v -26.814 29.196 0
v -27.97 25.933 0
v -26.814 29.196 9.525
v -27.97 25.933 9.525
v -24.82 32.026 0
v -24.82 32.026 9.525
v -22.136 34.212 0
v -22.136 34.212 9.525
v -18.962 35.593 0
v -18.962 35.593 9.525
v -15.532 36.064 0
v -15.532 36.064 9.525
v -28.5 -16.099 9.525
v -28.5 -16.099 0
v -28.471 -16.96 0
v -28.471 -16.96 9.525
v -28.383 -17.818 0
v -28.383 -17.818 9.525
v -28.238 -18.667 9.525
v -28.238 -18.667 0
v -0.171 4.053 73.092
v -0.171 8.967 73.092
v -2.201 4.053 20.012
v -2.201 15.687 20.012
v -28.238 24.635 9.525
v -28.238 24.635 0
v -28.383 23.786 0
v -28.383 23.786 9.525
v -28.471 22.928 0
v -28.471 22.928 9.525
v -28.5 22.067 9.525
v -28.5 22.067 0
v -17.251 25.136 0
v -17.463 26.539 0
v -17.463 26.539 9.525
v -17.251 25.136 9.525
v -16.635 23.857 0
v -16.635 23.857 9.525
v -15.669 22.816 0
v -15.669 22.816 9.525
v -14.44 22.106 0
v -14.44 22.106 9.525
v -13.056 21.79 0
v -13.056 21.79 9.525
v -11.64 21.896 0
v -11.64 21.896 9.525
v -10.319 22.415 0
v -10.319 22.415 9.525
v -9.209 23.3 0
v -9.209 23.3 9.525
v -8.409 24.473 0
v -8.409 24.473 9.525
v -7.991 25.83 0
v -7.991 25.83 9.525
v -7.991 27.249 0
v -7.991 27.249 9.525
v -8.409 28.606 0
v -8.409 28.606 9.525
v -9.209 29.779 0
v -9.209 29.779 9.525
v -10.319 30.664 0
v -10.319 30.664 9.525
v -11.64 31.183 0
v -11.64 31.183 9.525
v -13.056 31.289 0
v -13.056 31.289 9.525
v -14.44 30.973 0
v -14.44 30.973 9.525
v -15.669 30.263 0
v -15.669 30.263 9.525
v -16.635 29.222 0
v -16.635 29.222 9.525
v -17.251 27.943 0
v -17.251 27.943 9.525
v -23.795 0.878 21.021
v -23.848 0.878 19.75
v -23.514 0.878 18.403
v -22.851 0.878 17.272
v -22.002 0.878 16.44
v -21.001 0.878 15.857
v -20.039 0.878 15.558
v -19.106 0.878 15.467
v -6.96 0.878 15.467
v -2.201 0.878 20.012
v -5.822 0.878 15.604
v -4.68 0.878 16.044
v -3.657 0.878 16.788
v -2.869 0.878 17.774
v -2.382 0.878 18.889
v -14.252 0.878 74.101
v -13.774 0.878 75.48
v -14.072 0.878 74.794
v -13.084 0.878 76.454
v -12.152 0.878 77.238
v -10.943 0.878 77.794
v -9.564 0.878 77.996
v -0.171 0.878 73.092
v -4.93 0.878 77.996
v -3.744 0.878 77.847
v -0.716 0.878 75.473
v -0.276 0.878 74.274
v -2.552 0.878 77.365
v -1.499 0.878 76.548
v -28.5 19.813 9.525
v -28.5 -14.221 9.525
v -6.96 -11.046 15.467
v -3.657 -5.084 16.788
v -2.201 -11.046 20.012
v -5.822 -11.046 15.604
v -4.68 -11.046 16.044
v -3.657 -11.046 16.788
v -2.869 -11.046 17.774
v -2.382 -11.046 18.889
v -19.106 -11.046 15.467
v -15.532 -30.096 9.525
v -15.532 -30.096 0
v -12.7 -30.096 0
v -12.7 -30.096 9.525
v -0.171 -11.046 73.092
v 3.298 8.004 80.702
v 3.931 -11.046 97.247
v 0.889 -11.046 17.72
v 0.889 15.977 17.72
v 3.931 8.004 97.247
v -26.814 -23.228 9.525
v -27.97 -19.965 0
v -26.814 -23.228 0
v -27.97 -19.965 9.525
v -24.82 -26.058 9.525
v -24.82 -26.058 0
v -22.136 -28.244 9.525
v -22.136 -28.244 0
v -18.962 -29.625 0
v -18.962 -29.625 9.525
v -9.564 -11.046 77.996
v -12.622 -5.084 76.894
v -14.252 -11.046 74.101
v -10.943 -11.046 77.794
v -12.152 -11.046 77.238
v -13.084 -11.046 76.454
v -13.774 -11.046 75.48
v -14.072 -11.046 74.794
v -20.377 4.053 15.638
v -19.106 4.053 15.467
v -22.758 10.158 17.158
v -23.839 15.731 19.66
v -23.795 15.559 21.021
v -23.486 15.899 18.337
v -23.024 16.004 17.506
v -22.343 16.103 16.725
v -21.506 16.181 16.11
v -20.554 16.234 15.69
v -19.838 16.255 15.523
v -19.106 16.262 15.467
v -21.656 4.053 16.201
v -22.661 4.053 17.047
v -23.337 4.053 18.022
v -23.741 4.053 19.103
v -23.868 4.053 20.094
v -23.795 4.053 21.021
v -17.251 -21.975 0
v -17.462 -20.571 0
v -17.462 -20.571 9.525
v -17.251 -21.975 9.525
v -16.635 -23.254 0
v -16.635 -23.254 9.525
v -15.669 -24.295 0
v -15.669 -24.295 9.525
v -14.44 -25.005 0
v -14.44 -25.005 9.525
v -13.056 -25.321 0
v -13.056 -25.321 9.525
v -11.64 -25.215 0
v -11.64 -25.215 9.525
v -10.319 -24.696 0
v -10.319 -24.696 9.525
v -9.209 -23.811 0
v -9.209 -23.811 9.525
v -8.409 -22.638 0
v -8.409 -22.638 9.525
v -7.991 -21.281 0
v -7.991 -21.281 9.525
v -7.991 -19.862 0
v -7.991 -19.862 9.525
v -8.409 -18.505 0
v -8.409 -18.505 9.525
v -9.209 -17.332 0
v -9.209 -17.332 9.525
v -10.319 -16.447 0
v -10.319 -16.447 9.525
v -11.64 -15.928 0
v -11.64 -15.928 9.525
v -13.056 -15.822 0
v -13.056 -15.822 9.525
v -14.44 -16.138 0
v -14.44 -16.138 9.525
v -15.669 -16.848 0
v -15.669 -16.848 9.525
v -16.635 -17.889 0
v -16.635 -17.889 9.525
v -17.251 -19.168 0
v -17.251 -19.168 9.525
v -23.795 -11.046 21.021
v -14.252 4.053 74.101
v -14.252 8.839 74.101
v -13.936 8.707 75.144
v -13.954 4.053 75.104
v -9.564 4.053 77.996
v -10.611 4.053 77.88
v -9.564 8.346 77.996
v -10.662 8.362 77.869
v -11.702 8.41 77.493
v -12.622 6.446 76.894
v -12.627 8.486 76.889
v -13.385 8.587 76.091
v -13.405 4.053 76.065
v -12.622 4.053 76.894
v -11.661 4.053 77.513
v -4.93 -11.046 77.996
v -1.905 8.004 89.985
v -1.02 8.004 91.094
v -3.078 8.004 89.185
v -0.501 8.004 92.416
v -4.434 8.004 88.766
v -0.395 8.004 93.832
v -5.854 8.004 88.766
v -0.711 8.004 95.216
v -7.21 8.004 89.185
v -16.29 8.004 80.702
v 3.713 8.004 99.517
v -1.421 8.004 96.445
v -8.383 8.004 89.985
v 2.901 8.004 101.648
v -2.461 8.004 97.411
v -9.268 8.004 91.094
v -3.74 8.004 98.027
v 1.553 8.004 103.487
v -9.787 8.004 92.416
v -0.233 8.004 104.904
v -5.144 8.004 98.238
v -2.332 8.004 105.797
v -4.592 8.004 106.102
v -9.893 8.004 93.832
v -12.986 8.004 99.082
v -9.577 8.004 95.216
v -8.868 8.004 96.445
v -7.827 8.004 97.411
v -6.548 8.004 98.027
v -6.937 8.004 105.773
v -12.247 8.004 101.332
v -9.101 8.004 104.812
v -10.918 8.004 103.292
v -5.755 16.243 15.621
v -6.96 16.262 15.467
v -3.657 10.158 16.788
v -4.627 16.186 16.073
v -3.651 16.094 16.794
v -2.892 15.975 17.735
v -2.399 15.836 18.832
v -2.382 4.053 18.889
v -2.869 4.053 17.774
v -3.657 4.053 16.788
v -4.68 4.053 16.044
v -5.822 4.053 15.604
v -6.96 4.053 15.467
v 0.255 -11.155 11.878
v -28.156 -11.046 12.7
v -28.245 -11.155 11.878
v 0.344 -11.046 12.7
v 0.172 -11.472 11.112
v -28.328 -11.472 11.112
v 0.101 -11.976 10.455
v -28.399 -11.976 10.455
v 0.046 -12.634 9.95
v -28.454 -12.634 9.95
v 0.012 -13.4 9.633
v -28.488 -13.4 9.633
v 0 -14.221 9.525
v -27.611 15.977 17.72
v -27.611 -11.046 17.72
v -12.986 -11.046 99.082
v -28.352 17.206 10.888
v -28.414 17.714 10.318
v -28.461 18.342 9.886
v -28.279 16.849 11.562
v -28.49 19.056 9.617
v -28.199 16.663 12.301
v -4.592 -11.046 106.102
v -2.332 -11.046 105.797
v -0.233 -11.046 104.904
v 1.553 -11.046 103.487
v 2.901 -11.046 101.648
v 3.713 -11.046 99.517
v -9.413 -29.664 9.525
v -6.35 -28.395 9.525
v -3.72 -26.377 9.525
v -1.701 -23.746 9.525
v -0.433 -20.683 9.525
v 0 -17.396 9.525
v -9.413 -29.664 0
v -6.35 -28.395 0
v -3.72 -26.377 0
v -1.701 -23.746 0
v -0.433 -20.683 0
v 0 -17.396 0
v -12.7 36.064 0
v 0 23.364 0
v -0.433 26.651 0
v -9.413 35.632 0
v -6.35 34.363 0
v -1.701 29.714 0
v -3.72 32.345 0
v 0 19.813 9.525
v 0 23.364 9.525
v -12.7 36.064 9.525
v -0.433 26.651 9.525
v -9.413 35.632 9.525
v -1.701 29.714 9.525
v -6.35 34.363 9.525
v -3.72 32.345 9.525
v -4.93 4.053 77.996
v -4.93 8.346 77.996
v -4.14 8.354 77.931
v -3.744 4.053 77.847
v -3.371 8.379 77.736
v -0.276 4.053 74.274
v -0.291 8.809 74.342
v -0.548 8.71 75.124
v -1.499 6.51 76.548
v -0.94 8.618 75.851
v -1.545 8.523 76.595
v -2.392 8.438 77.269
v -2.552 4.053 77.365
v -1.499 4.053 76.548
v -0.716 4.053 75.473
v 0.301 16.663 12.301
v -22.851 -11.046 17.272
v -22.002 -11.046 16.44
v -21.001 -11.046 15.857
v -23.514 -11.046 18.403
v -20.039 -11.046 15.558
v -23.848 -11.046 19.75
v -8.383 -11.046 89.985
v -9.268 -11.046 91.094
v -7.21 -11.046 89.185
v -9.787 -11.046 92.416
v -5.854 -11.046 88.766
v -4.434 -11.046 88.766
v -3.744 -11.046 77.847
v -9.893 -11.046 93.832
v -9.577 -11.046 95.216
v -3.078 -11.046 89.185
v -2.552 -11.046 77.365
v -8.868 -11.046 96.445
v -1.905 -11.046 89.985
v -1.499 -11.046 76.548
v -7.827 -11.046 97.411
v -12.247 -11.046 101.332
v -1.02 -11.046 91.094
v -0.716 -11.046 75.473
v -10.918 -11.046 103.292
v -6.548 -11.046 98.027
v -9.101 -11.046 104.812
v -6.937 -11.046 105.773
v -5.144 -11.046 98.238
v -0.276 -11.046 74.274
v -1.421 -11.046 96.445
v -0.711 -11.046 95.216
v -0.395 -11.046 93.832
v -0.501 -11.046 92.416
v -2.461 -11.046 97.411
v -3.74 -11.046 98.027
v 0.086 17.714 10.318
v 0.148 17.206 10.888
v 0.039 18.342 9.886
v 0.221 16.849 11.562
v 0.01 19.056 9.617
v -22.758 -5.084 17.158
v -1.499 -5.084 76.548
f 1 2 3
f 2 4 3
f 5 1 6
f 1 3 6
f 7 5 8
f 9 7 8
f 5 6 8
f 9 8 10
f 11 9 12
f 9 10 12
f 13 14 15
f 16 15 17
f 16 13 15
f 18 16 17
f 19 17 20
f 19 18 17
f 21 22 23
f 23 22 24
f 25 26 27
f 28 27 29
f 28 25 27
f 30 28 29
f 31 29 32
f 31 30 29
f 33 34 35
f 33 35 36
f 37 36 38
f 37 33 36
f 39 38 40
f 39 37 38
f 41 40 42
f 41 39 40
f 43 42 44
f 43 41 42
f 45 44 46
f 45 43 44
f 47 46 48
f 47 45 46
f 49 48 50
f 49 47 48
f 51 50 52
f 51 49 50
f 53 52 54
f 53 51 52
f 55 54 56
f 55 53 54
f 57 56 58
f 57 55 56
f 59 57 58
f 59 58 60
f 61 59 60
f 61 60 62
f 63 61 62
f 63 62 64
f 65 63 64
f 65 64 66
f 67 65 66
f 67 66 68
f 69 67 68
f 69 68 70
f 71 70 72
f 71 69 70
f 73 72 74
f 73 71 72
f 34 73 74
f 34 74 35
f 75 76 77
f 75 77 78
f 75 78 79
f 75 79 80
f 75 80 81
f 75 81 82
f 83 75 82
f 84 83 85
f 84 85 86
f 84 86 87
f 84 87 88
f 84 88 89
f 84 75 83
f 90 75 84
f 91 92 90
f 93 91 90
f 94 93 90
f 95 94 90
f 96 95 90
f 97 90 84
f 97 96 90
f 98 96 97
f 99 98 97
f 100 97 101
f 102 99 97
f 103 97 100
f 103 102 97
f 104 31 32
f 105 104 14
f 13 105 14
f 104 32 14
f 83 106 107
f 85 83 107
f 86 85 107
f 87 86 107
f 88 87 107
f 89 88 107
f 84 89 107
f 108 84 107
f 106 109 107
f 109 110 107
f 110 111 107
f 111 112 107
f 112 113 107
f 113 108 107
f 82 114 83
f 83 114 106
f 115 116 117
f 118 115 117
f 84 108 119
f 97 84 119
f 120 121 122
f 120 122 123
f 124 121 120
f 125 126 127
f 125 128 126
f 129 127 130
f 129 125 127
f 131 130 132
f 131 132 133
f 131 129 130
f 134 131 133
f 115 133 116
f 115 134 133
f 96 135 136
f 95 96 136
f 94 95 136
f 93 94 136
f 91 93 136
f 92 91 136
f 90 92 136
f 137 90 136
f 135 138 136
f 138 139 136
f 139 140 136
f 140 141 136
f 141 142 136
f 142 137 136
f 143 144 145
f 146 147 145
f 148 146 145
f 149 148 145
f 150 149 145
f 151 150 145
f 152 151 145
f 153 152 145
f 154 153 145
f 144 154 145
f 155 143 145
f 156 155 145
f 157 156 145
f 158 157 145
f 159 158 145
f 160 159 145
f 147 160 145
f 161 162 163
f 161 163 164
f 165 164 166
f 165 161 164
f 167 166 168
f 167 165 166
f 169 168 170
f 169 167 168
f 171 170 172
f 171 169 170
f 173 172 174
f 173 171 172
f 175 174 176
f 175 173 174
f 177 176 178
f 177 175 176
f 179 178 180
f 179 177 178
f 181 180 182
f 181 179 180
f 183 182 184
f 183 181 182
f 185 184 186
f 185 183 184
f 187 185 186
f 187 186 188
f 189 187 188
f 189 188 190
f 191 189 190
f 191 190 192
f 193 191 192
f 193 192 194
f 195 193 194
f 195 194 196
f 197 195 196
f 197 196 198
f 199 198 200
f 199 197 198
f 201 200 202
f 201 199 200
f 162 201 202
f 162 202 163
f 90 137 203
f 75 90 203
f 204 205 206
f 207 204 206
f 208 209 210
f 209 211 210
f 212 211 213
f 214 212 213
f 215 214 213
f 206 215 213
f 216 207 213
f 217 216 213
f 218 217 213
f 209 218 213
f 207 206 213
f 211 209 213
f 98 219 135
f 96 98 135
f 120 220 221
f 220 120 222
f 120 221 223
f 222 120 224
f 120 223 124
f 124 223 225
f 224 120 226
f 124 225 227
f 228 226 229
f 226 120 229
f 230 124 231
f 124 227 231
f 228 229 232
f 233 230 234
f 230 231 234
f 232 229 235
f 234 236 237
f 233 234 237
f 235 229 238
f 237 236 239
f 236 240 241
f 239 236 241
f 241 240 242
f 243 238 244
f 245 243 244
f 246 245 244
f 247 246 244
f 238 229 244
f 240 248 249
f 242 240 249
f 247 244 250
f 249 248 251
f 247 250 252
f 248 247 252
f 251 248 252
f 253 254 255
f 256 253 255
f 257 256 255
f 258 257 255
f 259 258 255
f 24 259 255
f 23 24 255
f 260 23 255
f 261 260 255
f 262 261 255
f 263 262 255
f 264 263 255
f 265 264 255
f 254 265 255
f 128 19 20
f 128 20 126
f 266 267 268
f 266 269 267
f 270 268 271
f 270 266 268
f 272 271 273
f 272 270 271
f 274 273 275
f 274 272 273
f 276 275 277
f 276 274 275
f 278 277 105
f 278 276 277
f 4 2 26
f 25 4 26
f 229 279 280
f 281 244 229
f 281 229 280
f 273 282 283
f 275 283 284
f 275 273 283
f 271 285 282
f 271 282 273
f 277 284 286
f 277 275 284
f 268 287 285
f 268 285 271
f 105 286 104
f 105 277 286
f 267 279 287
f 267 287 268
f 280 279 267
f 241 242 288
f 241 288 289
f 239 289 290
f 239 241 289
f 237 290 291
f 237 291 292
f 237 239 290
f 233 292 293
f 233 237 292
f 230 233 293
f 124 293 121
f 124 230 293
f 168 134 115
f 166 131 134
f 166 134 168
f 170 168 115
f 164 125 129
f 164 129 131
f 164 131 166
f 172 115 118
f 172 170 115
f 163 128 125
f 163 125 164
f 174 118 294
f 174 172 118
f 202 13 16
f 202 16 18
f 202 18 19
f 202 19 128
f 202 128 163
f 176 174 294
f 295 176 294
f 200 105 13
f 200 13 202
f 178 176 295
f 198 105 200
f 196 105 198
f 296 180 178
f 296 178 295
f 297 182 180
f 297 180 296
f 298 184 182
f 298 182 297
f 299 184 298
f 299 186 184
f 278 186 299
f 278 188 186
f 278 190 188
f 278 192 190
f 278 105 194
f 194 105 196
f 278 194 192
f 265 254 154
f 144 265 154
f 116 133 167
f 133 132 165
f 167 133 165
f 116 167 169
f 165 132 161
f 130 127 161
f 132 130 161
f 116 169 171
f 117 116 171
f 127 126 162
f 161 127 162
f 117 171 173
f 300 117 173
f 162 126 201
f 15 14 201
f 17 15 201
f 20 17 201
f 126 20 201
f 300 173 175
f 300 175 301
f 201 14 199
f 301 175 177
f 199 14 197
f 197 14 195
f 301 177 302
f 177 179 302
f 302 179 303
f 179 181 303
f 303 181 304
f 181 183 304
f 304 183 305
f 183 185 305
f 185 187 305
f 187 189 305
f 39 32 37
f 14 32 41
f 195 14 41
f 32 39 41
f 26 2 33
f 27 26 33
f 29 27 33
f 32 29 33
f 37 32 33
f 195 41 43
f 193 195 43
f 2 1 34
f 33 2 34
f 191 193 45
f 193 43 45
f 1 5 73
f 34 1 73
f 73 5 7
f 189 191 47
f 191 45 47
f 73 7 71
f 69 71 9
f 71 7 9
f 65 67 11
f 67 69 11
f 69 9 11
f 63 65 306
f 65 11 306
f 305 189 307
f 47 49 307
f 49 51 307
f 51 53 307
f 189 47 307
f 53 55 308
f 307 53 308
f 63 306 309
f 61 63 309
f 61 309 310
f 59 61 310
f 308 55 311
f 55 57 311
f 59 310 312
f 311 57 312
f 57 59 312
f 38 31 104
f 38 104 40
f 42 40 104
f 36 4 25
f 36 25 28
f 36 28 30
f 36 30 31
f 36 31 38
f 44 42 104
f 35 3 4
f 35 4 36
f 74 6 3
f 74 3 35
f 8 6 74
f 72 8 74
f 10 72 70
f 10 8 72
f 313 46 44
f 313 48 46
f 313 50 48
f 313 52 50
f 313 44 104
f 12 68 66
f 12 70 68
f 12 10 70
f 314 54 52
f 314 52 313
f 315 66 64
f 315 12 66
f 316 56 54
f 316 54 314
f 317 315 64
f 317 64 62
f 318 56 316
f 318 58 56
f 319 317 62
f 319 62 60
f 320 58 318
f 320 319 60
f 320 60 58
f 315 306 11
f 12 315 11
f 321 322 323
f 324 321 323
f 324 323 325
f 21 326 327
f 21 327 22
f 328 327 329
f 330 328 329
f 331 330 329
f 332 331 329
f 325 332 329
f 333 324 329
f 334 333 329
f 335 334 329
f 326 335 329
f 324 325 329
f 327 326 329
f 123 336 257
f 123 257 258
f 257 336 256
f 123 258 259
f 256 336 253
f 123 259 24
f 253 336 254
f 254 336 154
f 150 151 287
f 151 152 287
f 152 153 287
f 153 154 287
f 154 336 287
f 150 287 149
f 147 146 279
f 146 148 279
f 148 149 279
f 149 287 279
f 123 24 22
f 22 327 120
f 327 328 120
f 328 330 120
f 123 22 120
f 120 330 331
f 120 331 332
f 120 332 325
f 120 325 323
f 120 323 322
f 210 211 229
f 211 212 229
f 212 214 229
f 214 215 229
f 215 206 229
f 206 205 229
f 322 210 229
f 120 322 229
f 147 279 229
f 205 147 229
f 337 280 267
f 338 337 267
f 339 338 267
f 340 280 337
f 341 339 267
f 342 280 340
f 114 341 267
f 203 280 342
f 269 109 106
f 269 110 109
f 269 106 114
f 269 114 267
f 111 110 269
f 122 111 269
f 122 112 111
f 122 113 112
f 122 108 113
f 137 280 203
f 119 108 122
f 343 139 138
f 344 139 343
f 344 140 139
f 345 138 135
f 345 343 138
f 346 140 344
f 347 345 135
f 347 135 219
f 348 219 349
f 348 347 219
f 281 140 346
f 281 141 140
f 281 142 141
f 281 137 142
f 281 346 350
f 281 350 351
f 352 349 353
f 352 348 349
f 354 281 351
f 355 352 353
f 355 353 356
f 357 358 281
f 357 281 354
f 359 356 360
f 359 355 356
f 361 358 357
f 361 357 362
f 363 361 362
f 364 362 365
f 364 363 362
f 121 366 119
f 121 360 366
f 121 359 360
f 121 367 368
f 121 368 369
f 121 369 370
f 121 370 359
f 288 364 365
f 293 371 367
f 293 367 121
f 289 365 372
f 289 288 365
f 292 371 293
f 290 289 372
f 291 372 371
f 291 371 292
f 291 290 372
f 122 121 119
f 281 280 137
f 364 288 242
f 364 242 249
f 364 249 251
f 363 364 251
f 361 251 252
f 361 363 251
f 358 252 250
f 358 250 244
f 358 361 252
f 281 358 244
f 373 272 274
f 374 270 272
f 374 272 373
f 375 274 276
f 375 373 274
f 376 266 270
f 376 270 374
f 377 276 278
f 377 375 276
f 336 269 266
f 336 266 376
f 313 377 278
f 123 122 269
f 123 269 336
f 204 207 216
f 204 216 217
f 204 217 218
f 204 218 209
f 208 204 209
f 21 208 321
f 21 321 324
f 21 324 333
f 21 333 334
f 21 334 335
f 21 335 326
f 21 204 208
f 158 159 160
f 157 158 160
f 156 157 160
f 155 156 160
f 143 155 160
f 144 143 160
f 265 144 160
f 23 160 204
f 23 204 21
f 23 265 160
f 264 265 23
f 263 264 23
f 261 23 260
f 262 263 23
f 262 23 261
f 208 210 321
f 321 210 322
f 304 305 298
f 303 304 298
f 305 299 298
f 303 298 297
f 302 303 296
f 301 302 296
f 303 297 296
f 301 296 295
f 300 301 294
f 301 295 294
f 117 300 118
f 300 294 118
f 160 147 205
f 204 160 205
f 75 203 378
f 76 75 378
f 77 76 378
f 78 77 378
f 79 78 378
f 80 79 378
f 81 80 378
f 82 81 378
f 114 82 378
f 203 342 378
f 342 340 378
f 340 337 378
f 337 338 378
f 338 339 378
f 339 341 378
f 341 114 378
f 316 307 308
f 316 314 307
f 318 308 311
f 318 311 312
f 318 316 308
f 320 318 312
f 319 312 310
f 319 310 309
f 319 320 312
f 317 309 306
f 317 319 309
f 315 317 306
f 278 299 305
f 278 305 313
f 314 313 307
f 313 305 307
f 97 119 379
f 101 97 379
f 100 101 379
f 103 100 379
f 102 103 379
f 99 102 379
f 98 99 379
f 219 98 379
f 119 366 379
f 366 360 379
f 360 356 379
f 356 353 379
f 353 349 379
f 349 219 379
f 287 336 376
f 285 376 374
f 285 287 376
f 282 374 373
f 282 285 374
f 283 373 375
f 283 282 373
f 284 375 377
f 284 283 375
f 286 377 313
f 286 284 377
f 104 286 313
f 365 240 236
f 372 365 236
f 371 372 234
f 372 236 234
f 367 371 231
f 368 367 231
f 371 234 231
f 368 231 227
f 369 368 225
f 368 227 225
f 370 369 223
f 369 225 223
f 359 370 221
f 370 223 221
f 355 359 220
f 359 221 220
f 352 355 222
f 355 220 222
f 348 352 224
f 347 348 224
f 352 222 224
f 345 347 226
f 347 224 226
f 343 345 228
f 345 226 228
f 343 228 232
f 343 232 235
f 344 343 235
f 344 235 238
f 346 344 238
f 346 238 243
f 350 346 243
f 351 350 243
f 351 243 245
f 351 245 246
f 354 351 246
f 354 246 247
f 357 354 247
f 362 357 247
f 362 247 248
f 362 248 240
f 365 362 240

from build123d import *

# Parameters (mm, degrees)
SKETCH1_R           = 4.762499999999989
SKETCH1_R_2         = 4.762500000000005
BOSS_EXTRUDE1_DEPTH = 9.525
CHAMFER1_SIZE       = 88.89999999999999
CHAMFER1_SIZE2      = 6.20588556630559
CHAMFER2_SIZE       = 88.89999999999999
CHAMFER2_SIZE2      = 6.300746042301969
FILLET1_R           = 8.528649
CUT_EXTRUDE2_DEPTH  = 117.6635246642072
FILLET4_R           = 3.175
FILLET5_R           = 12.7
FILLET6_R           = 12.7
SKETCH15_R          = 4.762499999999997
CUT_EXTRUDE7_DEPTH  = 117.28166143642893
FILLET9_R           = 12.7
CUT_EXTRUDE8_DEPTH  = 15.760091062
CUT_EXTRUDE9_DEPTH  = 11.924211795


with BuildPart() as part:
    # Sketch1 → Boss-Extrude1 (new body)
    # profile 1 of 3: a face of its own
    with BuildSketch(Plane.XY):
        Polygon((-28.50000000000001, 23.36447913627793), (-28.500000000000007, 17.01447913627793), (-1.421e-14, 17.01447913627793), (-1.388e-14, 36.06447913627791), (-25.877441230163292, 36.06447913627793), align=None)
        with Locations(Location((-12.700000000000017, 26.539479136277926, 0), (0, 0, 180))):
            Circle(SKETCH1_R, mode=Mode.SUBTRACT)
    # profile 2 of 3: a face of its own
    with BuildSketch(Plane.XY):
        Polygon((1.421e-14, -11.046434023496033), (-28.499999999999996, -11.046434023496033), (-28.499999999999996, -17.396434023496035), (-25.877441230163278, -30.09643402349603), (1.421e-14, -30.09643402349603), align=None)
        with Locations(Location((-12.699999999999989, -20.571434023496032, 0), (0, 0, 180))):
            Circle(SKETCH1_R_2, mode=Mode.SUBTRACT)
    # profile 3 of 3: a face of its own
    with BuildSketch(Plane.XY):
        Polygon((-28.500000000000007, 17.01447913627793), (-28.5, -11.046434023496033), (1.421e-14, -11.046434023496033), (-5.89e-15, 17.014479136277927), align=None)
    extrude(amount=BOSS_EXTRUDE1_DEPTH)

    # Sweep1: sweep along a path in Sketch4
    with BuildLine(Plane(origin=(0, -11.046434023496033, 0), x_dir=(1, 0, 0), z_dir=(0, 1, 0))) as sweep1_path:
        Line((-14.249999999999991, -9.525), (-5.144041152540681, -93.4757286489478))
        Line((-5.144041152540681, -93.4757286489478), (-3.7745316583277084, -106.10167193035296))
    # Sketch3 → Sweep1 (sweep)
    with BuildSketch(Plane.XY.offset(9.525)):
        Polygon((-28.499999999999996, -11.046434023496033), (1.388e-14, -11.046434023496033), (-1.388e-14, 17.01447913627793), (-28.50000000000001, 17.01447913627793), align=None)
    sweep(path=sweep1_path.line)

    # Chamfer1
    chamfer1_edges = [part.edges().sort_by_distance(p)[0] for p in [
        (10.475468341672286, 2.9840225563909506, 106.10167193035296),
    ]]
    chamfer1_side = [part.faces().sort_by_distance(p)[0] for p in [
        (5.237734170836156, 2.9840225563909497, 57.813335965176485),
    ]]
    chamfer(chamfer1_edges, length=CHAMFER1_SIZE, length2=CHAMFER1_SIZE2, reference=chamfer1_side[0])

    # Chamfer2
    chamfer2_edges = [part.edges().sort_by_distance(p)[0] for p in [
        (-18.02453165832772, 2.984022556390949, 106.10167193035296),
    ]]
    chamfer2_side = [part.faces().sort_by_distance(p)[0] for p in [
        (-23.26226582916385, 2.9840225563909497, 57.813335965176506),
    ]]
    chamfer(chamfer2_edges, length=CHAMFER2_SIZE, length2=CHAMFER2_SIZE2, reference=chamfer2_side[0])

    # Fillet1
    fillet1_edges = [part.edges().sort_by_distance(p)[0] for p in [
        (4.269582775366721, 2.984022556390949, 106.10167193035296),
        (-11.72378561602573, 2.984022556390949, 106.10167193035296),
    ]]
    fillet(fillet1_edges, radius=FILLET1_R)

    # Sketch6 → Cut-Extrude2 (cut, through all)
    with BuildSketch(Plane.ZY.offset(28.500000000000004)):
        Polygon((106.10167193035296, -11.046434023496188), (93.47572864894777, -11.0464340234961), (80.70167193035297, -11.046434023496028), (114.70610576395035, -29.45752993708947), (128.32769329374543, 30.37810454166645), (17.720068960516624, 36.90132837728653), (9.525, 17.01447913627794), (80.70167193035296, 8.003565976503989), (106.10167193035296, 8.003565976503813), align=None)
    extrude(amount=-CUT_EXTRUDE2_DEPTH, mode=Mode.SUBTRACT)

    # Fillet4
    fillet4_edges = [part.edges().sort_by_distance(p)[0] for p in [
        (-14.249999999999995, -11.046434023496033, 9.525),
        (-14.25000000000001, 17.01447913627793, 9.525),
    ]]
    fillet(fillet4_edges, radius=FILLET4_R)

    # Fillet5
    fillet5_edges = [part.edges().sort_by_distance(p)[0] for p in [
        (-28.50000000000001, 23.36447913627793, 4.7625),
    ]]
    fillet(fillet5_edges, radius=FILLET5_R)

    # Fillet6
    fillet6_edges = [part.edges().sort_by_distance(p)[0] for p in [
        (-1.404e-14, 36.06447913627791, 4.7625),
        (-25.877441230163292, 36.06447913627793, 4.7625),
    ]]
    fillet(fillet6_edges, radius=FILLET6_R)

    # Sketch15 → Cut-Extrude7 (cut, through all)
    with BuildSketch(Plane(origin=(-2.72e-15, 8.00356597650455, 5.575e-14), x_dir=(1, 3.4e-16, -6e-17), z_dir=(-3.4e-16, 1, 6.99e-15))):
        with Locations(Location((-5.144041152540378, -93.47572864894777, 0), (0, 0, 270))):
            Circle(SKETCH15_R)
    extrude(amount=-CUT_EXTRUDE7_DEPTH, mode=Mode.SUBTRACT)

    # Fillet9
    fillet9_edges = [part.edges().sort_by_distance(p)[0] for p in [
        (1.404e-14, -30.09643402349603, 4.7625),
        (-25.877441230163278, -30.09643402349603, 4.7625),
        (-28.499999999999996, -17.396434023496035, 4.7625),
    ]]
    fillet(fillet9_edges, radius=FILLET9_R)

    # Sketch17 → Cut-Extrude8 (cut)
    with BuildSketch(Plane(origin=(0, 19.81286883339098, 0), x_dir=(1, 0, 0), z_dir=(0, 1, 0))):
        with BuildLine():
            Line((-23.794838845791546, -21.021241844192982), (-14.252419863558526, -74.10090839762722))
            add(Edge.make_bspline(
                [(-14.252419863558526, -74.10090839762722), (-13.55215795886545, -77.99611237791656), (-9.563905474722917, -77.99611237791653)],
                knots=[0.17649604429034987, 0.17649604429034987, 0.17649604429034987, 1.5707963267949046, 1.5707963267949046, 1.5707963267949046], degree=2, weights=[1, 0.7666750083054215, 1]))
            Line((-9.563905474722917, -77.99611237791653), (-4.929711575818474, -77.99611237791652))
            add(Edge.make_bspline(
                [(-4.929711575818474, -77.99611237791652), (0.01696199328928838, -77.99611237791657), (-0.17063766624835885, -73.09214006513507)],
                knots=[1.5707963267948917, 1.5707963267948917, 1.5707963267948917, 3.179526156898573, 3.179526156898573, 3.179526156898573], degree=2, weights=[1, 0.693568883905337, 1]))
            Line((-0.17063766624835885, -73.09214006513507), (-2.201180813451869, -20.012473511700826))
            add(Edge.make_bspline(
                [(-2.201180813451869, -20.012473511700826), (-2.3750711783370813, -15.466870726714172), (-6.960254723021984, -15.466870726714202)],
                knots=[0.03793350330876585, 0.03793350330876585, 0.03793350330876585, 1.5707963267949063, 1.5707963267949063, 1.5707963267949063], degree=2, weights=[1, 0.7203903131485674, 1]))
            Line((-6.960254723021984, -15.466870726714202), (-19.10632445695594, -15.466870726714204))
            add(Edge.make_bspline(
                [(-19.10632445695594, -15.466870726714204), (-24.79337820798673, -15.466870726714157), (-23.794838845791546, -21.021241844192982)],
                knots=[1.5707963267948915, 1.5707963267948915, 1.5707963267948915, 3.318088697880159, 3.318088697880159, 3.318088697880159], degree=2, weights=[1, 0.6420353819221085, 1]))
        make_face()
    extrude(amount=-CUT_EXTRUDE8_DEPTH, mode=Mode.SUBTRACT)

    # Sketch18 → Cut-Extrude9 (cut)
    with BuildSketch(Plane.XZ.offset(11.046434023496033)):
        with BuildLine():
            Line((-4.929711575818475, 77.99611237791653), (-9.563905474722917, 77.99611237791653))
            add(Edge.make_bspline(
                [(-9.563905474722917, 77.99611237791653), (-13.55215795886545, 77.99611237791656), (-14.252419863558526, 74.10090839762722)],
                knots=[4.712388980384682, 4.712388980384682, 4.712388980384682, 6.106689262889237, 6.106689262889237, 6.106689262889237], degree=2, weights=[1, 0.7666750083054213, 1]))
            Line((-14.252419863558526, 74.10090839762722), (-23.794838845791546, 21.021241844192982))
            add(Edge.make_bspline(
                [(-23.794838845791546, 21.021241844192982), (-24.79337820798673, 15.466870726714156), (-19.10632445695594, 15.466870726714204)],
                knots=[2.9650966092994273, 2.9650966092994273, 2.9650966092994273, 4.712388980384695, 4.712388980384695, 4.712388980384695], degree=2, weights=[1, 0.6420353819221084, 1]))
            Line((-19.10632445695594, 15.466870726714204), (-6.960254723021985, 15.466870726714204))
            add(Edge.make_bspline(
                [(-6.960254723021985, 15.466870726714204), (-2.3750711783370777, 15.46687072671417), (-2.201180813451869, 20.012473511700826)],
                knots=[4.71238898038468, 4.71238898038468, 4.71238898038468, 6.245251803870821, 6.245251803870821, 6.245251803870821], degree=2, weights=[1, 0.7203903131485672, 1]))
            Line((-2.201180813451869, 20.012473511700826), (-0.17063766624835808, 73.09214006513507))
            add(Edge.make_bspline(
                [(-0.17063766624835808, 73.09214006513507), (0.0169619932892866, 77.99611237791657), (-4.929711575818475, 77.99611237791653)],
                knots=[3.103659150281014, 3.103659150281014, 3.103659150281014, 4.712388980384695, 4.712388980384695, 4.712388980384695], degree=2, weights=[1, 0.693568883905337, 1]))
        make_face()
    extrude(amount=-CUT_EXTRUDE9_DEPTH, mode=Mode.SUBTRACT)


solid = part.part
